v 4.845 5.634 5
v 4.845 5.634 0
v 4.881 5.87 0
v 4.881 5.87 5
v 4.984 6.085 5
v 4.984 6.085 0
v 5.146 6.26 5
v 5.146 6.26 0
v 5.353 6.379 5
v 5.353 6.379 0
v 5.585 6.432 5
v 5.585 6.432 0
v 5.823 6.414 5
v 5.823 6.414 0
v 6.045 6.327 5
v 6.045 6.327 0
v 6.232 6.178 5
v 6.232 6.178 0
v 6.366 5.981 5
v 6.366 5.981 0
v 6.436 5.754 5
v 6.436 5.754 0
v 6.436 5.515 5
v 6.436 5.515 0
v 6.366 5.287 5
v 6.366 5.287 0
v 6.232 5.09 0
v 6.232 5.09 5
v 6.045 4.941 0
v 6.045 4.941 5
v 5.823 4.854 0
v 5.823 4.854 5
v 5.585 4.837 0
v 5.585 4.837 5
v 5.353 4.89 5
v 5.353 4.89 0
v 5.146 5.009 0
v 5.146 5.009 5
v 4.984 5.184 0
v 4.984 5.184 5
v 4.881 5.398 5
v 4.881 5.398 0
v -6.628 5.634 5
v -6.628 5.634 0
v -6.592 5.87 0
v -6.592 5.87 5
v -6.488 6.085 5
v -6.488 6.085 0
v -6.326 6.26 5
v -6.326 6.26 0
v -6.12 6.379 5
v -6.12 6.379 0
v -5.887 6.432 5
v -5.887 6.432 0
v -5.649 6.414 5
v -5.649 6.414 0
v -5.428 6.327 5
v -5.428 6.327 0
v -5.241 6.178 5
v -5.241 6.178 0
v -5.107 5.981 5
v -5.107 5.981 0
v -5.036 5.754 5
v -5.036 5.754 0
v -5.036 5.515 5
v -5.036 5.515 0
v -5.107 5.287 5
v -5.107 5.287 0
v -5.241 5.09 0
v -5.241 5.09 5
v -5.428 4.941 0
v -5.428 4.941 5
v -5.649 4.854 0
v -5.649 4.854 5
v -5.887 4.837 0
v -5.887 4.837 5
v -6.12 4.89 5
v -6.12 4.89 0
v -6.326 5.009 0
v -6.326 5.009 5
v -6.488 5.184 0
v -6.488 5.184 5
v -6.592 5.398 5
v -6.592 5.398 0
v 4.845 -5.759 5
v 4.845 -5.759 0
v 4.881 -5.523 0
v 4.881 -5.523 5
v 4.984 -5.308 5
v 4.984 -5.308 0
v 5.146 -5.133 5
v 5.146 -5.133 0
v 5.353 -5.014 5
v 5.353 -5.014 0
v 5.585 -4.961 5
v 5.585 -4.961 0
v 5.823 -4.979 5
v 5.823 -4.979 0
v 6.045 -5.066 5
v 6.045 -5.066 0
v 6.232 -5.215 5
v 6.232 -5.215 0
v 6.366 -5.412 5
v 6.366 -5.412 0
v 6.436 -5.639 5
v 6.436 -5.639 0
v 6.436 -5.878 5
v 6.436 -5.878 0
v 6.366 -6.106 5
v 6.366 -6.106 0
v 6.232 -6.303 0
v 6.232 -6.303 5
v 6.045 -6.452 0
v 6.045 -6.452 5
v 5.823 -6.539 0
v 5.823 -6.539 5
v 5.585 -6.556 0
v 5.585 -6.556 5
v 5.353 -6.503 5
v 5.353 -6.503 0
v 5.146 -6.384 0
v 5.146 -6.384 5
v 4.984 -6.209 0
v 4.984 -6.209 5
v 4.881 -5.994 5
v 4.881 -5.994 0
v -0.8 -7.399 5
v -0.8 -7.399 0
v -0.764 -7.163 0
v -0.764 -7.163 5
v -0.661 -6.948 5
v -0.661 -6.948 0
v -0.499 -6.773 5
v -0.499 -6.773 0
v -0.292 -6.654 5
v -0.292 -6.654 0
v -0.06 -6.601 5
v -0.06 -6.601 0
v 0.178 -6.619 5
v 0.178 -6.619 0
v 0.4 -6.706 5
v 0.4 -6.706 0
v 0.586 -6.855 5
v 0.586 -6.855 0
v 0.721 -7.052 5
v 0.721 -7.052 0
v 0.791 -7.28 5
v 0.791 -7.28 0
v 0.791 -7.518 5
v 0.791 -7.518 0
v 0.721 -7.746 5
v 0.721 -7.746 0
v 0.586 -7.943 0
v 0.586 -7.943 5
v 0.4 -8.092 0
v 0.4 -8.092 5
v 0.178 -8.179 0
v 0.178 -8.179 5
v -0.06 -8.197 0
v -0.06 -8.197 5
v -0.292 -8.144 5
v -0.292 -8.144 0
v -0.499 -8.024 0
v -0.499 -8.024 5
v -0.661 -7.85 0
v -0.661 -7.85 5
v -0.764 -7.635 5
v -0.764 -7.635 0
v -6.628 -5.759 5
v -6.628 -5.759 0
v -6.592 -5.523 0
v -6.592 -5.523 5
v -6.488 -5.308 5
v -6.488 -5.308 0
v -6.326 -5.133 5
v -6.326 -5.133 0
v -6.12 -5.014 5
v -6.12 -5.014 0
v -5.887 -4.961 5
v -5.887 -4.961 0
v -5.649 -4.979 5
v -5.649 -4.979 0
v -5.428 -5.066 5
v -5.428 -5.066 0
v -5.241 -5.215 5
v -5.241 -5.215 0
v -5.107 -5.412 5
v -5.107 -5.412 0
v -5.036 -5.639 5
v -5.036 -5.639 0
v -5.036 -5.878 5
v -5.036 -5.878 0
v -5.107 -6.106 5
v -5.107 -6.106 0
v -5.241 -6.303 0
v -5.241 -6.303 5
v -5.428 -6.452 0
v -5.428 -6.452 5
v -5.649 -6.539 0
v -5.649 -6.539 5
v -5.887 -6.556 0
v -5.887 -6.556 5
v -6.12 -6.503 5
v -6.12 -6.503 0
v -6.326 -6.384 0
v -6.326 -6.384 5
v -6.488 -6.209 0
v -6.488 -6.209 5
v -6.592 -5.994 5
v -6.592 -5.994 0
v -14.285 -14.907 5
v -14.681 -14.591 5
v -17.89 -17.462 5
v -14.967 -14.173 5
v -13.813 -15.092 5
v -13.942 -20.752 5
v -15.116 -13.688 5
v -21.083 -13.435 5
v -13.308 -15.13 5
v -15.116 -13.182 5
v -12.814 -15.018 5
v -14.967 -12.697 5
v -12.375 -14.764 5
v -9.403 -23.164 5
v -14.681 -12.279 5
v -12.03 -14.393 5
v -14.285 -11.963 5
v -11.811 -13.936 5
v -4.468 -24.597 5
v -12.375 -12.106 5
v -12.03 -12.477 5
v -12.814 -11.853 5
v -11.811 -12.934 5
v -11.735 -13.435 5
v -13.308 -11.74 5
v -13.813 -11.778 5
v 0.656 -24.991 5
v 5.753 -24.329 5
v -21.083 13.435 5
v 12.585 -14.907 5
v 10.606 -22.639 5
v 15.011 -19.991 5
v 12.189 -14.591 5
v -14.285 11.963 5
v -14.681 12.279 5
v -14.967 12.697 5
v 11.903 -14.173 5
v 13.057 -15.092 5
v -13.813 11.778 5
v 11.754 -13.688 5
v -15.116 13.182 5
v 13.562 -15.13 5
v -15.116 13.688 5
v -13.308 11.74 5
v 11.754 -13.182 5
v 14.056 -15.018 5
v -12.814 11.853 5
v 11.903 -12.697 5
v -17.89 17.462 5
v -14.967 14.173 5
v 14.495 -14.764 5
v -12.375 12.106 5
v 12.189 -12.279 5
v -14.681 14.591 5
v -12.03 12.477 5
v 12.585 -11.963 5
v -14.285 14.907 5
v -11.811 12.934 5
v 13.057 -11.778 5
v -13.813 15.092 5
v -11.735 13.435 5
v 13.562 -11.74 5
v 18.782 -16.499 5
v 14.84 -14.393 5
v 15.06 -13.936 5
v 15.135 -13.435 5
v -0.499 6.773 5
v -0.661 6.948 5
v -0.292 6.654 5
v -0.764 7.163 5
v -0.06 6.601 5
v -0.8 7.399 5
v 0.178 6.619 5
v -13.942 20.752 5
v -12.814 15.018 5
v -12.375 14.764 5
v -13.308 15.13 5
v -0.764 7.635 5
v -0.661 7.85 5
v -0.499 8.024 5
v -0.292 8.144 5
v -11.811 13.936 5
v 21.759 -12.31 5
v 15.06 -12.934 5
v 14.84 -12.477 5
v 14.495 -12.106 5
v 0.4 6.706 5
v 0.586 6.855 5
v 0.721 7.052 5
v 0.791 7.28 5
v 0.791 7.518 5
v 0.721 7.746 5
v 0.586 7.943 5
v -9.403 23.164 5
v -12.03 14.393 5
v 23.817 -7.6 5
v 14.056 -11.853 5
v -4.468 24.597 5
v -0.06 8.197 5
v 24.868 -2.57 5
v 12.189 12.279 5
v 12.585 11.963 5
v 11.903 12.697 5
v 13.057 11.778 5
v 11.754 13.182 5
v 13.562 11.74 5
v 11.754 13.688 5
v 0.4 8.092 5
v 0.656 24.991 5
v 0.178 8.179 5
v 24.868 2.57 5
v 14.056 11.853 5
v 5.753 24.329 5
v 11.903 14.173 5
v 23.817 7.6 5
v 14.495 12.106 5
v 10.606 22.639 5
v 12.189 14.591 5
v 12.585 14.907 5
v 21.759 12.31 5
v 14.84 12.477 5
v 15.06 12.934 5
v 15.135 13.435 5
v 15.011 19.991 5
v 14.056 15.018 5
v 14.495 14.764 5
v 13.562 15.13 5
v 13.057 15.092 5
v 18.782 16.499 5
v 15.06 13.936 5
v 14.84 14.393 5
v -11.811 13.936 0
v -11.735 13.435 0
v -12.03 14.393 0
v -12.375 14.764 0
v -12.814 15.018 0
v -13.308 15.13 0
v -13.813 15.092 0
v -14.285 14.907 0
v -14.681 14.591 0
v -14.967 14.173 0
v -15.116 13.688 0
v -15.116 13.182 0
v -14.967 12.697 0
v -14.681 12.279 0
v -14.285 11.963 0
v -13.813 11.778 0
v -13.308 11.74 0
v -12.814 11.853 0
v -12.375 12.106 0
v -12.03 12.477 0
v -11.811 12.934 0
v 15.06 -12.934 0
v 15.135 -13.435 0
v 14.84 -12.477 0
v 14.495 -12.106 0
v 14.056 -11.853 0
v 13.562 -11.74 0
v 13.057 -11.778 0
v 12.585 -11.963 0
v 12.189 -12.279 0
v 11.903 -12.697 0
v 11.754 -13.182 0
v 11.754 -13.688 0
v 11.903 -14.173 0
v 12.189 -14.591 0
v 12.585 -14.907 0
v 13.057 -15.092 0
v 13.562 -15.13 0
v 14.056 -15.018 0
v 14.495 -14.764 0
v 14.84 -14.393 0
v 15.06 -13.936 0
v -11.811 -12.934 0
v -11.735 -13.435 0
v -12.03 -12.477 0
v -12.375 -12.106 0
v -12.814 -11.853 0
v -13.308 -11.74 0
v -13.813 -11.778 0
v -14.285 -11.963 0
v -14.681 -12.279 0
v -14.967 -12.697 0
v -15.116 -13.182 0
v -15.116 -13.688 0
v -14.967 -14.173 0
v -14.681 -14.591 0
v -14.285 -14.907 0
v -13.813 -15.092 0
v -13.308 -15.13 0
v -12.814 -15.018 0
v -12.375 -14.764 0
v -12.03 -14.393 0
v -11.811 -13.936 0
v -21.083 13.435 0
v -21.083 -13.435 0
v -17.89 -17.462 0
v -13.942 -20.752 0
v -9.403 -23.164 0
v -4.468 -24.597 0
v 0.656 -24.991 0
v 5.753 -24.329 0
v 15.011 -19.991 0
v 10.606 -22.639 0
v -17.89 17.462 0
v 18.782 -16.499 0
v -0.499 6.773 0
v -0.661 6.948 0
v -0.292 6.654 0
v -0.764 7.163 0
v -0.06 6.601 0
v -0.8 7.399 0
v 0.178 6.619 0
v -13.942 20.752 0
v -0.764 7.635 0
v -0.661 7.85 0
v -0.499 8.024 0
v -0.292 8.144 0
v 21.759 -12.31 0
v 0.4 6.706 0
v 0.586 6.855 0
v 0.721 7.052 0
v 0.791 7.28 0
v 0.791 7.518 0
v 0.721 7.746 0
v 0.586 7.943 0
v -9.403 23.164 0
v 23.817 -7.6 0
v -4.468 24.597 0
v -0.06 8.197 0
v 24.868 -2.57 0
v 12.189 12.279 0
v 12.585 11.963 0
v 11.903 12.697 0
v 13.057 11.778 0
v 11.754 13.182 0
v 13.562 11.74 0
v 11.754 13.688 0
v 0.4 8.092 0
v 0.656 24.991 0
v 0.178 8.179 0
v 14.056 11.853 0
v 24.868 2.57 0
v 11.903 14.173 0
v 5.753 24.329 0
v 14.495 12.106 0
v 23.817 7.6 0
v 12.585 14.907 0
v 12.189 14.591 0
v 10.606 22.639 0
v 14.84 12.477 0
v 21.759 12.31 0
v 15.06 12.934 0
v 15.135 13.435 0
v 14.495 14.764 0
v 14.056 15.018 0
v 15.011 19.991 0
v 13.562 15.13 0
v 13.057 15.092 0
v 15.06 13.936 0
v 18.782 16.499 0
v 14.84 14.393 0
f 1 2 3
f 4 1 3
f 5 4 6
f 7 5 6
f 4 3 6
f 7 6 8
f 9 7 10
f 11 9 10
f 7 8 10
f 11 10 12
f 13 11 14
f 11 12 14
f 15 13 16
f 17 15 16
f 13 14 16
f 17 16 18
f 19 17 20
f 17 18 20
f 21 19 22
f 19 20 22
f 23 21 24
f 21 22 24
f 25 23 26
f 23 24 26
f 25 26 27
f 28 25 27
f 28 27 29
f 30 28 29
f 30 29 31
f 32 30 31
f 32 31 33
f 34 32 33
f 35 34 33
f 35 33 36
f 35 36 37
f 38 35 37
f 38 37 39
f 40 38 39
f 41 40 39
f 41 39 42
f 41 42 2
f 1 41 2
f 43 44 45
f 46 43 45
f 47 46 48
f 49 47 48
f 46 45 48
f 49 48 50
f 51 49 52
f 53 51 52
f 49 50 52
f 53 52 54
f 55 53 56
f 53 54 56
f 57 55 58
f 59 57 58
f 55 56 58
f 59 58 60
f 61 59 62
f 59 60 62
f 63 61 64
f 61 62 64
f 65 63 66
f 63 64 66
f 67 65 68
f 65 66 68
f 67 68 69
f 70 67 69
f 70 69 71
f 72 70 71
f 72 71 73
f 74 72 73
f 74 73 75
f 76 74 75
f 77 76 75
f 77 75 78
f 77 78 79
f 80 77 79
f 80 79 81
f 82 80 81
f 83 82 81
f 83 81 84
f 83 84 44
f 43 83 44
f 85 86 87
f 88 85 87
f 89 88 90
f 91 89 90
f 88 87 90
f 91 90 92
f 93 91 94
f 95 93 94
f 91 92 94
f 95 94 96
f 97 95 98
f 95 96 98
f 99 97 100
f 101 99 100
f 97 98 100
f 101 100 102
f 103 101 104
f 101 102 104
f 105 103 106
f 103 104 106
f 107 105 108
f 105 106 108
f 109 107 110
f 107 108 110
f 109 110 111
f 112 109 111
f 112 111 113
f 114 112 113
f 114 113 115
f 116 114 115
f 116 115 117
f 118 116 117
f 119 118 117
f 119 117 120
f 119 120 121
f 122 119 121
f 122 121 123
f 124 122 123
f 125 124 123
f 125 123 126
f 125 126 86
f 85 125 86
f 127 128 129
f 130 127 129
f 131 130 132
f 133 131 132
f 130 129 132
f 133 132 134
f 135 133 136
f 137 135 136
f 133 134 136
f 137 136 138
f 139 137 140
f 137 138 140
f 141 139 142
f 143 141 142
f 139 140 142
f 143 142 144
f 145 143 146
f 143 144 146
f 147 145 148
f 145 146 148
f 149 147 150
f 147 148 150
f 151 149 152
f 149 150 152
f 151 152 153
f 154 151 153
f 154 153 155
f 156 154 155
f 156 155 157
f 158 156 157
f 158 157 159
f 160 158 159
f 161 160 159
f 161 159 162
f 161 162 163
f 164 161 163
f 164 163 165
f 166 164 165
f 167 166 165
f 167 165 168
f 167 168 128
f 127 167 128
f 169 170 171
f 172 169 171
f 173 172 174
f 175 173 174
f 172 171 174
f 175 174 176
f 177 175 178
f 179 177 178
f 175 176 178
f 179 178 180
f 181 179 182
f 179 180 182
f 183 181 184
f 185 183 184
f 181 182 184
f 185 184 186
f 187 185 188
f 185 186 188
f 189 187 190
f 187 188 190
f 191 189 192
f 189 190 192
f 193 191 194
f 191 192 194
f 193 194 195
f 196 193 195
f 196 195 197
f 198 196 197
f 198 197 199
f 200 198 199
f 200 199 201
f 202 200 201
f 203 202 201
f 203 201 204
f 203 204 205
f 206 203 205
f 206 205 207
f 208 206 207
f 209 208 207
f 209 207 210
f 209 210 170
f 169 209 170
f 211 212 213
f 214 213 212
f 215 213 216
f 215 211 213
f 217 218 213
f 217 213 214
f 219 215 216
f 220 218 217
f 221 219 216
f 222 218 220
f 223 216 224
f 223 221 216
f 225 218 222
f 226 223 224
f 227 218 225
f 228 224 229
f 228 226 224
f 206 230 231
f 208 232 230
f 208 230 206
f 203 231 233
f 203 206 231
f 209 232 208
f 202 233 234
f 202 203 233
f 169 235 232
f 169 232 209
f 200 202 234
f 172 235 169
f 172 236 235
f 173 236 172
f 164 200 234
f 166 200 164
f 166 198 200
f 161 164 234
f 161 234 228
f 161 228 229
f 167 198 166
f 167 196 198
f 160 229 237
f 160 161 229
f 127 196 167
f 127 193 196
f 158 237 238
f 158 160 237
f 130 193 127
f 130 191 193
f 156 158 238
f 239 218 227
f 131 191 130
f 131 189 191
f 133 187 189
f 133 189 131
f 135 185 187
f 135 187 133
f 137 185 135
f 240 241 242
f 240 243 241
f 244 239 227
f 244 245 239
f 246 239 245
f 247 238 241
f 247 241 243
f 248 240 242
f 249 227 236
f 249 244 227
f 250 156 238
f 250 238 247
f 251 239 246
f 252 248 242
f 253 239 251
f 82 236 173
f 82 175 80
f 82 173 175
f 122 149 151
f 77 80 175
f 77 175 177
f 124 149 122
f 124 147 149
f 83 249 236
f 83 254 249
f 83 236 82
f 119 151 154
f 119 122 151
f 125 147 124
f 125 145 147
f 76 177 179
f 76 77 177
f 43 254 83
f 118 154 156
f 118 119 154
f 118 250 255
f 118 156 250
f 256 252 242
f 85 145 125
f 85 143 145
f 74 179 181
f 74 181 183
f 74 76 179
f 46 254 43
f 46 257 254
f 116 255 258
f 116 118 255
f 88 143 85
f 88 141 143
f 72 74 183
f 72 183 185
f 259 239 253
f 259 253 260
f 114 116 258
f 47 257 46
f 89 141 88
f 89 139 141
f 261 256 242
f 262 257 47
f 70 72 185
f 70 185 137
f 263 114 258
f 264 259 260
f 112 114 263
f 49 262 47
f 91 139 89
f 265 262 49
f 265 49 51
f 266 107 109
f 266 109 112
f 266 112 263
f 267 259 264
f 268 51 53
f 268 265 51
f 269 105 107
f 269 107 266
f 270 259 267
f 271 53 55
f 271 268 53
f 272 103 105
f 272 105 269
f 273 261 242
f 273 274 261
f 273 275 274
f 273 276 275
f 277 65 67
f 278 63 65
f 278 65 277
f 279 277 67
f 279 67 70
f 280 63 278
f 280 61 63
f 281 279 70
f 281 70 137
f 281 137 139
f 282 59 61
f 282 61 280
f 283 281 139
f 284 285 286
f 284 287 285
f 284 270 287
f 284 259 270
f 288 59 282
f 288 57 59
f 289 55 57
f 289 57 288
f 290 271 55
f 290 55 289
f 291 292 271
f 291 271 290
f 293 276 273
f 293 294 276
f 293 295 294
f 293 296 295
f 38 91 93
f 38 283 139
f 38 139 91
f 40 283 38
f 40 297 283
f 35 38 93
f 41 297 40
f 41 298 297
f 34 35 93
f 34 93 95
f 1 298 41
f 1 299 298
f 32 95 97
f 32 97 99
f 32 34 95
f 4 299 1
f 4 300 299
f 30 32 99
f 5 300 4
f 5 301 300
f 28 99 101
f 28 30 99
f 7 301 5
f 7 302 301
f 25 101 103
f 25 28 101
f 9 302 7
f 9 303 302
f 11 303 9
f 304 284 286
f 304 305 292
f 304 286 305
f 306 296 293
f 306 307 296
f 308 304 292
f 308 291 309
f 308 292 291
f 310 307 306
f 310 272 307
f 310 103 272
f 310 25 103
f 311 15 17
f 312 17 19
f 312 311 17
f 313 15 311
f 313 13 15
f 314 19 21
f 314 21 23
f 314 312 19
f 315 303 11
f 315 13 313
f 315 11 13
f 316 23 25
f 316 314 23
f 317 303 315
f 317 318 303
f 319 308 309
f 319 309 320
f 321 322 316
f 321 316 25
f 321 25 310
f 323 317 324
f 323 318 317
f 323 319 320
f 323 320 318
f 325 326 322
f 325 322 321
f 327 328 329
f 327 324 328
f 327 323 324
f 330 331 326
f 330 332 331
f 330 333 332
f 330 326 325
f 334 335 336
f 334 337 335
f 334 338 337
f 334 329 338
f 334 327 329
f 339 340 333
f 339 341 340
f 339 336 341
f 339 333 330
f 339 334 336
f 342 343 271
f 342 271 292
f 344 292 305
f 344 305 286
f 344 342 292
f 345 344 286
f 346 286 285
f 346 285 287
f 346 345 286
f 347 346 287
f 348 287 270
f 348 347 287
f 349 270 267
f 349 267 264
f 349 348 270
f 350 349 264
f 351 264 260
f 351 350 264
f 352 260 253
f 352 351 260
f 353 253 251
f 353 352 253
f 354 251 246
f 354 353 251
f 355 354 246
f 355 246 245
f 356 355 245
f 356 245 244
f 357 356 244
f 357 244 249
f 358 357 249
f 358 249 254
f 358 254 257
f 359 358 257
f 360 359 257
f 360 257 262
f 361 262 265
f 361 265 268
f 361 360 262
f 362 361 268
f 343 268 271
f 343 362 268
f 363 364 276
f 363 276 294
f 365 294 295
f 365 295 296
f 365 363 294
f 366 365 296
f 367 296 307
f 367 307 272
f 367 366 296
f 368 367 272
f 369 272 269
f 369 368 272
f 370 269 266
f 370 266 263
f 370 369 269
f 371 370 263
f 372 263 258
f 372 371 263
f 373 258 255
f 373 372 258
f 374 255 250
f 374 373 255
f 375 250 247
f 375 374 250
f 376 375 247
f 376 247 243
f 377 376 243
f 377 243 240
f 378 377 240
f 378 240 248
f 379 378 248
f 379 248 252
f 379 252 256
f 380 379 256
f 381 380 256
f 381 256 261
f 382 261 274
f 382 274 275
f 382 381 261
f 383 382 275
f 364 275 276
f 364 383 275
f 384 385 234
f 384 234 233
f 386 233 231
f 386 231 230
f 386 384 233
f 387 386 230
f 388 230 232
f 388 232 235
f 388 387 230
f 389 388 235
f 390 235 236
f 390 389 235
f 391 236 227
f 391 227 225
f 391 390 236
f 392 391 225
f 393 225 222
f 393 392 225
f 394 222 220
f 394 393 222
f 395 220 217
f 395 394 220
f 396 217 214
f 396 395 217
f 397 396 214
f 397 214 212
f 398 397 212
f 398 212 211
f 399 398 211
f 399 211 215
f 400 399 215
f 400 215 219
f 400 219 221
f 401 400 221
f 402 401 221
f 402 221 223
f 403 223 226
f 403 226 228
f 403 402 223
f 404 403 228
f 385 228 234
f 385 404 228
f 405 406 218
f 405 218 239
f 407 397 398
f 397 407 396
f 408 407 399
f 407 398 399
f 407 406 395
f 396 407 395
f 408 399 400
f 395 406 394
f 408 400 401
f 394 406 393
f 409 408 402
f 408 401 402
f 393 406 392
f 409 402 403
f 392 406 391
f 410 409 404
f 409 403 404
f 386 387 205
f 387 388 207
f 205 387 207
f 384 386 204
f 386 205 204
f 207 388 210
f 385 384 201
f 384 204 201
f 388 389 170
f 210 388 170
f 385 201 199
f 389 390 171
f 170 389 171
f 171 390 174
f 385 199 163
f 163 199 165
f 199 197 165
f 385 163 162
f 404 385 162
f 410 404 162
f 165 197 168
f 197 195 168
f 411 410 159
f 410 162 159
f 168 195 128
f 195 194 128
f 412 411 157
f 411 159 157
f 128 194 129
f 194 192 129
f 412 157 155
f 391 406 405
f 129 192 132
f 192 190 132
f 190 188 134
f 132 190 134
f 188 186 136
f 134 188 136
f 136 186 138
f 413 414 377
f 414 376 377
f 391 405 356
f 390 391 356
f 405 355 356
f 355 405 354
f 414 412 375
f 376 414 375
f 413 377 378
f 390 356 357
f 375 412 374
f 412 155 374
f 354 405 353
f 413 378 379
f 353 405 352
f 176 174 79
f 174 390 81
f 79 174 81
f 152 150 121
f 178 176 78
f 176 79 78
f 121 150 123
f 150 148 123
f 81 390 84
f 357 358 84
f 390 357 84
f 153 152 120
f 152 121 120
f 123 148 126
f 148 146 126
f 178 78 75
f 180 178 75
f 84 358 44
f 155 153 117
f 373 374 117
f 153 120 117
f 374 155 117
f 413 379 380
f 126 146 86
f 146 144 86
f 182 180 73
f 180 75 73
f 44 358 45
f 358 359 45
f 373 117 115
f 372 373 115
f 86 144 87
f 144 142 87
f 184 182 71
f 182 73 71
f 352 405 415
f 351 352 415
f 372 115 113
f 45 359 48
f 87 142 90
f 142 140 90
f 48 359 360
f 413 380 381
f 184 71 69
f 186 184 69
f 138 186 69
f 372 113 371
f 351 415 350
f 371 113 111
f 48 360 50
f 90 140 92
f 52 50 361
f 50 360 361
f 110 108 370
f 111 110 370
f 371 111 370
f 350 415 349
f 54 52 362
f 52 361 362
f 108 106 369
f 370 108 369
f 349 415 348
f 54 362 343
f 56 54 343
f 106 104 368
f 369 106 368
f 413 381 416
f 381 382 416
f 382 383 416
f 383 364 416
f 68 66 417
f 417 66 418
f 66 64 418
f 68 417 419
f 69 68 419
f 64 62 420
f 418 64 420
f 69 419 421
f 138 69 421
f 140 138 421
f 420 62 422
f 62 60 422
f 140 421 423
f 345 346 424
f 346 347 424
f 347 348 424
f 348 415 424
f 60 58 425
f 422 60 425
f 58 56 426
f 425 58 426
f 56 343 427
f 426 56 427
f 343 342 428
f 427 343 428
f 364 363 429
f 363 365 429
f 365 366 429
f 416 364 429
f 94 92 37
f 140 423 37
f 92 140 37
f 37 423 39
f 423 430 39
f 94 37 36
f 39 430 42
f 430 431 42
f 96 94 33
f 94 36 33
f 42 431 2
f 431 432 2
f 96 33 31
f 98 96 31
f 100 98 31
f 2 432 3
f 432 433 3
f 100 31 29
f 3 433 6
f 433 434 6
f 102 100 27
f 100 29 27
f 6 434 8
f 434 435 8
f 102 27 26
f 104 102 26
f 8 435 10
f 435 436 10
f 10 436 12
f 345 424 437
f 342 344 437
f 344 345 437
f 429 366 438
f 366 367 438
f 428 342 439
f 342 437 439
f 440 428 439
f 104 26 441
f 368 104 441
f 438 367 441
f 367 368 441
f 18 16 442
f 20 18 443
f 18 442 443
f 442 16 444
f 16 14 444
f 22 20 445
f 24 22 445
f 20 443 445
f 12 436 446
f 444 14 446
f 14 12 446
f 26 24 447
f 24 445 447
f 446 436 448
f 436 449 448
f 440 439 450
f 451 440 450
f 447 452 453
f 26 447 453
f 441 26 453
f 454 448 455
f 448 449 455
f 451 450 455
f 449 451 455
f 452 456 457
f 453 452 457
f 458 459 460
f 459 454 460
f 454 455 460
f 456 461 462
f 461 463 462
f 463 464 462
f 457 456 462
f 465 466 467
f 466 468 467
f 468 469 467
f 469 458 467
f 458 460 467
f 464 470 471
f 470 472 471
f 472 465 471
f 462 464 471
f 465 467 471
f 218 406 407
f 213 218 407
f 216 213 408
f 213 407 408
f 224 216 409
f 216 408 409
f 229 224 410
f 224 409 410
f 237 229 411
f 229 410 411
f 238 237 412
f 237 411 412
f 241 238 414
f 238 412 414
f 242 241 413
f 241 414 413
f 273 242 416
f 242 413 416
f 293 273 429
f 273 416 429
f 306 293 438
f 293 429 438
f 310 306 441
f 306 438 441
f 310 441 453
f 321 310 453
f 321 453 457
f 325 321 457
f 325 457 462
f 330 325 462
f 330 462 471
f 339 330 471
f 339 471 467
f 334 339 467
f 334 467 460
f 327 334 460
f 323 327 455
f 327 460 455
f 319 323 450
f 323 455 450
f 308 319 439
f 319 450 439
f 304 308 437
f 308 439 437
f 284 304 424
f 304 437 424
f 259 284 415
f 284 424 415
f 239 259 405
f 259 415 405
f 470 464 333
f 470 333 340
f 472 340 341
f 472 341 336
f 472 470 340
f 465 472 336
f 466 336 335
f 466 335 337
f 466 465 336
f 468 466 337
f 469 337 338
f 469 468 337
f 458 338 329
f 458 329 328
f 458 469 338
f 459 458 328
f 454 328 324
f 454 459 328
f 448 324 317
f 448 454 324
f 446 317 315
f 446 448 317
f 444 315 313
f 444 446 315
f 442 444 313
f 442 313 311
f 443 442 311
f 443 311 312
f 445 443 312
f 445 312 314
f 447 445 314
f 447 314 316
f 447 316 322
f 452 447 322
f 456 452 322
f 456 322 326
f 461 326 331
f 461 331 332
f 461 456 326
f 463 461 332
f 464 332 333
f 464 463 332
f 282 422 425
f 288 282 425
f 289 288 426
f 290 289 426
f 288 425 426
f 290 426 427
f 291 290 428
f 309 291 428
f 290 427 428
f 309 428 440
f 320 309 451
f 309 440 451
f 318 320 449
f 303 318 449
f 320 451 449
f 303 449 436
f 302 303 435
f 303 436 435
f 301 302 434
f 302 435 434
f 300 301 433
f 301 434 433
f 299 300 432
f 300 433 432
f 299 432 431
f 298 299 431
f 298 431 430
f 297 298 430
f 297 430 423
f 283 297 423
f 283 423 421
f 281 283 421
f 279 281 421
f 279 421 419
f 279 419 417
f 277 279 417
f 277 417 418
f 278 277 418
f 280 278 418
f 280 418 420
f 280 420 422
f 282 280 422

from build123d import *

# Parameters (mm, degrees)
ESQUISSE1_R             = 25
ESQUISSE1_R_2           = 1.7
BOSS_EXTRU_1_DEPTH      = 5
ESQUISSE11_R            = 0.8
ENL_V_MAT_EXTRU_1_DEPTH = 36.707142143
ESQUISSE13_W            = 4.903660669
ESQUISSE13_H            = 28.894120166
ENL_V_MAT_EXTRU_2_DEPTH = 36.707142143


with BuildPart() as part:
    # Esquisse1 → Boss.-Extru.1 (new body)
    with BuildSketch(Plane.XY):
        Circle(ESQUISSE1_R)
        with Locations((-13.435028843, 13.435028843)):
            Circle(ESQUISSE1_R_2, mode=Mode.SUBTRACT)
        with Locations((13.435028843, 13.435028843)):
            Circle(ESQUISSE1_R_2, mode=Mode.SUBTRACT)
        with Locations((13.435028843, -13.435028843)):
            Circle(ESQUISSE1_R_2, mode=Mode.SUBTRACT)
        with Locations((-13.435028843, -13.435028843)):
            Circle(ESQUISSE1_R_2, mode=Mode.SUBTRACT)
    extrude(amount=BOSS_EXTRU_1_DEPTH)

    # Esquisse11 → Enlèv. mat.-Extru.1 (cut, through all)
    with BuildSketch(Plane(origin=(0, 0, 0), x_dir=(-1, 0, 0), z_dir=(0, 0, -1))):
        with Locations((0, 7.398882196)):
            Circle(ESQUISSE11_R)
        with Locations((5.827506735, 5.634287936)):
            Circle(ESQUISSE11_R)
        with Locations((5.827506735, -5.758693792)):
            Circle(ESQUISSE11_R)
        with Locations((0, -7.398882196)):
            Circle(ESQUISSE11_R)
        with Locations((-5.645080413, -5.758693792)):
            Circle(ESQUISSE11_R)
        with Locations((-5.645080413, 5.634287936)):
            Circle(ESQUISSE11_R)
    extrude(amount=-ENL_V_MAT_EXTRU_1_DEPTH, mode=Mode.SUBTRACT)

    # Esquisse13 → Enlèv. mat.-Extru.2 (cut, through all)
    with BuildSketch(Plane(origin=(0, 0, 0), x_dir=(-1, 0, 0), z_dir=(0, 0, -1))):
        with Locations((23.534998976, -1.01203124)):
            Rectangle(ESQUISSE13_W, ESQUISSE13_H)
    extrude(amount=-ENL_V_MAT_EXTRU_2_DEPTH, mode=Mode.SUBTRACT)


solid = part.part
